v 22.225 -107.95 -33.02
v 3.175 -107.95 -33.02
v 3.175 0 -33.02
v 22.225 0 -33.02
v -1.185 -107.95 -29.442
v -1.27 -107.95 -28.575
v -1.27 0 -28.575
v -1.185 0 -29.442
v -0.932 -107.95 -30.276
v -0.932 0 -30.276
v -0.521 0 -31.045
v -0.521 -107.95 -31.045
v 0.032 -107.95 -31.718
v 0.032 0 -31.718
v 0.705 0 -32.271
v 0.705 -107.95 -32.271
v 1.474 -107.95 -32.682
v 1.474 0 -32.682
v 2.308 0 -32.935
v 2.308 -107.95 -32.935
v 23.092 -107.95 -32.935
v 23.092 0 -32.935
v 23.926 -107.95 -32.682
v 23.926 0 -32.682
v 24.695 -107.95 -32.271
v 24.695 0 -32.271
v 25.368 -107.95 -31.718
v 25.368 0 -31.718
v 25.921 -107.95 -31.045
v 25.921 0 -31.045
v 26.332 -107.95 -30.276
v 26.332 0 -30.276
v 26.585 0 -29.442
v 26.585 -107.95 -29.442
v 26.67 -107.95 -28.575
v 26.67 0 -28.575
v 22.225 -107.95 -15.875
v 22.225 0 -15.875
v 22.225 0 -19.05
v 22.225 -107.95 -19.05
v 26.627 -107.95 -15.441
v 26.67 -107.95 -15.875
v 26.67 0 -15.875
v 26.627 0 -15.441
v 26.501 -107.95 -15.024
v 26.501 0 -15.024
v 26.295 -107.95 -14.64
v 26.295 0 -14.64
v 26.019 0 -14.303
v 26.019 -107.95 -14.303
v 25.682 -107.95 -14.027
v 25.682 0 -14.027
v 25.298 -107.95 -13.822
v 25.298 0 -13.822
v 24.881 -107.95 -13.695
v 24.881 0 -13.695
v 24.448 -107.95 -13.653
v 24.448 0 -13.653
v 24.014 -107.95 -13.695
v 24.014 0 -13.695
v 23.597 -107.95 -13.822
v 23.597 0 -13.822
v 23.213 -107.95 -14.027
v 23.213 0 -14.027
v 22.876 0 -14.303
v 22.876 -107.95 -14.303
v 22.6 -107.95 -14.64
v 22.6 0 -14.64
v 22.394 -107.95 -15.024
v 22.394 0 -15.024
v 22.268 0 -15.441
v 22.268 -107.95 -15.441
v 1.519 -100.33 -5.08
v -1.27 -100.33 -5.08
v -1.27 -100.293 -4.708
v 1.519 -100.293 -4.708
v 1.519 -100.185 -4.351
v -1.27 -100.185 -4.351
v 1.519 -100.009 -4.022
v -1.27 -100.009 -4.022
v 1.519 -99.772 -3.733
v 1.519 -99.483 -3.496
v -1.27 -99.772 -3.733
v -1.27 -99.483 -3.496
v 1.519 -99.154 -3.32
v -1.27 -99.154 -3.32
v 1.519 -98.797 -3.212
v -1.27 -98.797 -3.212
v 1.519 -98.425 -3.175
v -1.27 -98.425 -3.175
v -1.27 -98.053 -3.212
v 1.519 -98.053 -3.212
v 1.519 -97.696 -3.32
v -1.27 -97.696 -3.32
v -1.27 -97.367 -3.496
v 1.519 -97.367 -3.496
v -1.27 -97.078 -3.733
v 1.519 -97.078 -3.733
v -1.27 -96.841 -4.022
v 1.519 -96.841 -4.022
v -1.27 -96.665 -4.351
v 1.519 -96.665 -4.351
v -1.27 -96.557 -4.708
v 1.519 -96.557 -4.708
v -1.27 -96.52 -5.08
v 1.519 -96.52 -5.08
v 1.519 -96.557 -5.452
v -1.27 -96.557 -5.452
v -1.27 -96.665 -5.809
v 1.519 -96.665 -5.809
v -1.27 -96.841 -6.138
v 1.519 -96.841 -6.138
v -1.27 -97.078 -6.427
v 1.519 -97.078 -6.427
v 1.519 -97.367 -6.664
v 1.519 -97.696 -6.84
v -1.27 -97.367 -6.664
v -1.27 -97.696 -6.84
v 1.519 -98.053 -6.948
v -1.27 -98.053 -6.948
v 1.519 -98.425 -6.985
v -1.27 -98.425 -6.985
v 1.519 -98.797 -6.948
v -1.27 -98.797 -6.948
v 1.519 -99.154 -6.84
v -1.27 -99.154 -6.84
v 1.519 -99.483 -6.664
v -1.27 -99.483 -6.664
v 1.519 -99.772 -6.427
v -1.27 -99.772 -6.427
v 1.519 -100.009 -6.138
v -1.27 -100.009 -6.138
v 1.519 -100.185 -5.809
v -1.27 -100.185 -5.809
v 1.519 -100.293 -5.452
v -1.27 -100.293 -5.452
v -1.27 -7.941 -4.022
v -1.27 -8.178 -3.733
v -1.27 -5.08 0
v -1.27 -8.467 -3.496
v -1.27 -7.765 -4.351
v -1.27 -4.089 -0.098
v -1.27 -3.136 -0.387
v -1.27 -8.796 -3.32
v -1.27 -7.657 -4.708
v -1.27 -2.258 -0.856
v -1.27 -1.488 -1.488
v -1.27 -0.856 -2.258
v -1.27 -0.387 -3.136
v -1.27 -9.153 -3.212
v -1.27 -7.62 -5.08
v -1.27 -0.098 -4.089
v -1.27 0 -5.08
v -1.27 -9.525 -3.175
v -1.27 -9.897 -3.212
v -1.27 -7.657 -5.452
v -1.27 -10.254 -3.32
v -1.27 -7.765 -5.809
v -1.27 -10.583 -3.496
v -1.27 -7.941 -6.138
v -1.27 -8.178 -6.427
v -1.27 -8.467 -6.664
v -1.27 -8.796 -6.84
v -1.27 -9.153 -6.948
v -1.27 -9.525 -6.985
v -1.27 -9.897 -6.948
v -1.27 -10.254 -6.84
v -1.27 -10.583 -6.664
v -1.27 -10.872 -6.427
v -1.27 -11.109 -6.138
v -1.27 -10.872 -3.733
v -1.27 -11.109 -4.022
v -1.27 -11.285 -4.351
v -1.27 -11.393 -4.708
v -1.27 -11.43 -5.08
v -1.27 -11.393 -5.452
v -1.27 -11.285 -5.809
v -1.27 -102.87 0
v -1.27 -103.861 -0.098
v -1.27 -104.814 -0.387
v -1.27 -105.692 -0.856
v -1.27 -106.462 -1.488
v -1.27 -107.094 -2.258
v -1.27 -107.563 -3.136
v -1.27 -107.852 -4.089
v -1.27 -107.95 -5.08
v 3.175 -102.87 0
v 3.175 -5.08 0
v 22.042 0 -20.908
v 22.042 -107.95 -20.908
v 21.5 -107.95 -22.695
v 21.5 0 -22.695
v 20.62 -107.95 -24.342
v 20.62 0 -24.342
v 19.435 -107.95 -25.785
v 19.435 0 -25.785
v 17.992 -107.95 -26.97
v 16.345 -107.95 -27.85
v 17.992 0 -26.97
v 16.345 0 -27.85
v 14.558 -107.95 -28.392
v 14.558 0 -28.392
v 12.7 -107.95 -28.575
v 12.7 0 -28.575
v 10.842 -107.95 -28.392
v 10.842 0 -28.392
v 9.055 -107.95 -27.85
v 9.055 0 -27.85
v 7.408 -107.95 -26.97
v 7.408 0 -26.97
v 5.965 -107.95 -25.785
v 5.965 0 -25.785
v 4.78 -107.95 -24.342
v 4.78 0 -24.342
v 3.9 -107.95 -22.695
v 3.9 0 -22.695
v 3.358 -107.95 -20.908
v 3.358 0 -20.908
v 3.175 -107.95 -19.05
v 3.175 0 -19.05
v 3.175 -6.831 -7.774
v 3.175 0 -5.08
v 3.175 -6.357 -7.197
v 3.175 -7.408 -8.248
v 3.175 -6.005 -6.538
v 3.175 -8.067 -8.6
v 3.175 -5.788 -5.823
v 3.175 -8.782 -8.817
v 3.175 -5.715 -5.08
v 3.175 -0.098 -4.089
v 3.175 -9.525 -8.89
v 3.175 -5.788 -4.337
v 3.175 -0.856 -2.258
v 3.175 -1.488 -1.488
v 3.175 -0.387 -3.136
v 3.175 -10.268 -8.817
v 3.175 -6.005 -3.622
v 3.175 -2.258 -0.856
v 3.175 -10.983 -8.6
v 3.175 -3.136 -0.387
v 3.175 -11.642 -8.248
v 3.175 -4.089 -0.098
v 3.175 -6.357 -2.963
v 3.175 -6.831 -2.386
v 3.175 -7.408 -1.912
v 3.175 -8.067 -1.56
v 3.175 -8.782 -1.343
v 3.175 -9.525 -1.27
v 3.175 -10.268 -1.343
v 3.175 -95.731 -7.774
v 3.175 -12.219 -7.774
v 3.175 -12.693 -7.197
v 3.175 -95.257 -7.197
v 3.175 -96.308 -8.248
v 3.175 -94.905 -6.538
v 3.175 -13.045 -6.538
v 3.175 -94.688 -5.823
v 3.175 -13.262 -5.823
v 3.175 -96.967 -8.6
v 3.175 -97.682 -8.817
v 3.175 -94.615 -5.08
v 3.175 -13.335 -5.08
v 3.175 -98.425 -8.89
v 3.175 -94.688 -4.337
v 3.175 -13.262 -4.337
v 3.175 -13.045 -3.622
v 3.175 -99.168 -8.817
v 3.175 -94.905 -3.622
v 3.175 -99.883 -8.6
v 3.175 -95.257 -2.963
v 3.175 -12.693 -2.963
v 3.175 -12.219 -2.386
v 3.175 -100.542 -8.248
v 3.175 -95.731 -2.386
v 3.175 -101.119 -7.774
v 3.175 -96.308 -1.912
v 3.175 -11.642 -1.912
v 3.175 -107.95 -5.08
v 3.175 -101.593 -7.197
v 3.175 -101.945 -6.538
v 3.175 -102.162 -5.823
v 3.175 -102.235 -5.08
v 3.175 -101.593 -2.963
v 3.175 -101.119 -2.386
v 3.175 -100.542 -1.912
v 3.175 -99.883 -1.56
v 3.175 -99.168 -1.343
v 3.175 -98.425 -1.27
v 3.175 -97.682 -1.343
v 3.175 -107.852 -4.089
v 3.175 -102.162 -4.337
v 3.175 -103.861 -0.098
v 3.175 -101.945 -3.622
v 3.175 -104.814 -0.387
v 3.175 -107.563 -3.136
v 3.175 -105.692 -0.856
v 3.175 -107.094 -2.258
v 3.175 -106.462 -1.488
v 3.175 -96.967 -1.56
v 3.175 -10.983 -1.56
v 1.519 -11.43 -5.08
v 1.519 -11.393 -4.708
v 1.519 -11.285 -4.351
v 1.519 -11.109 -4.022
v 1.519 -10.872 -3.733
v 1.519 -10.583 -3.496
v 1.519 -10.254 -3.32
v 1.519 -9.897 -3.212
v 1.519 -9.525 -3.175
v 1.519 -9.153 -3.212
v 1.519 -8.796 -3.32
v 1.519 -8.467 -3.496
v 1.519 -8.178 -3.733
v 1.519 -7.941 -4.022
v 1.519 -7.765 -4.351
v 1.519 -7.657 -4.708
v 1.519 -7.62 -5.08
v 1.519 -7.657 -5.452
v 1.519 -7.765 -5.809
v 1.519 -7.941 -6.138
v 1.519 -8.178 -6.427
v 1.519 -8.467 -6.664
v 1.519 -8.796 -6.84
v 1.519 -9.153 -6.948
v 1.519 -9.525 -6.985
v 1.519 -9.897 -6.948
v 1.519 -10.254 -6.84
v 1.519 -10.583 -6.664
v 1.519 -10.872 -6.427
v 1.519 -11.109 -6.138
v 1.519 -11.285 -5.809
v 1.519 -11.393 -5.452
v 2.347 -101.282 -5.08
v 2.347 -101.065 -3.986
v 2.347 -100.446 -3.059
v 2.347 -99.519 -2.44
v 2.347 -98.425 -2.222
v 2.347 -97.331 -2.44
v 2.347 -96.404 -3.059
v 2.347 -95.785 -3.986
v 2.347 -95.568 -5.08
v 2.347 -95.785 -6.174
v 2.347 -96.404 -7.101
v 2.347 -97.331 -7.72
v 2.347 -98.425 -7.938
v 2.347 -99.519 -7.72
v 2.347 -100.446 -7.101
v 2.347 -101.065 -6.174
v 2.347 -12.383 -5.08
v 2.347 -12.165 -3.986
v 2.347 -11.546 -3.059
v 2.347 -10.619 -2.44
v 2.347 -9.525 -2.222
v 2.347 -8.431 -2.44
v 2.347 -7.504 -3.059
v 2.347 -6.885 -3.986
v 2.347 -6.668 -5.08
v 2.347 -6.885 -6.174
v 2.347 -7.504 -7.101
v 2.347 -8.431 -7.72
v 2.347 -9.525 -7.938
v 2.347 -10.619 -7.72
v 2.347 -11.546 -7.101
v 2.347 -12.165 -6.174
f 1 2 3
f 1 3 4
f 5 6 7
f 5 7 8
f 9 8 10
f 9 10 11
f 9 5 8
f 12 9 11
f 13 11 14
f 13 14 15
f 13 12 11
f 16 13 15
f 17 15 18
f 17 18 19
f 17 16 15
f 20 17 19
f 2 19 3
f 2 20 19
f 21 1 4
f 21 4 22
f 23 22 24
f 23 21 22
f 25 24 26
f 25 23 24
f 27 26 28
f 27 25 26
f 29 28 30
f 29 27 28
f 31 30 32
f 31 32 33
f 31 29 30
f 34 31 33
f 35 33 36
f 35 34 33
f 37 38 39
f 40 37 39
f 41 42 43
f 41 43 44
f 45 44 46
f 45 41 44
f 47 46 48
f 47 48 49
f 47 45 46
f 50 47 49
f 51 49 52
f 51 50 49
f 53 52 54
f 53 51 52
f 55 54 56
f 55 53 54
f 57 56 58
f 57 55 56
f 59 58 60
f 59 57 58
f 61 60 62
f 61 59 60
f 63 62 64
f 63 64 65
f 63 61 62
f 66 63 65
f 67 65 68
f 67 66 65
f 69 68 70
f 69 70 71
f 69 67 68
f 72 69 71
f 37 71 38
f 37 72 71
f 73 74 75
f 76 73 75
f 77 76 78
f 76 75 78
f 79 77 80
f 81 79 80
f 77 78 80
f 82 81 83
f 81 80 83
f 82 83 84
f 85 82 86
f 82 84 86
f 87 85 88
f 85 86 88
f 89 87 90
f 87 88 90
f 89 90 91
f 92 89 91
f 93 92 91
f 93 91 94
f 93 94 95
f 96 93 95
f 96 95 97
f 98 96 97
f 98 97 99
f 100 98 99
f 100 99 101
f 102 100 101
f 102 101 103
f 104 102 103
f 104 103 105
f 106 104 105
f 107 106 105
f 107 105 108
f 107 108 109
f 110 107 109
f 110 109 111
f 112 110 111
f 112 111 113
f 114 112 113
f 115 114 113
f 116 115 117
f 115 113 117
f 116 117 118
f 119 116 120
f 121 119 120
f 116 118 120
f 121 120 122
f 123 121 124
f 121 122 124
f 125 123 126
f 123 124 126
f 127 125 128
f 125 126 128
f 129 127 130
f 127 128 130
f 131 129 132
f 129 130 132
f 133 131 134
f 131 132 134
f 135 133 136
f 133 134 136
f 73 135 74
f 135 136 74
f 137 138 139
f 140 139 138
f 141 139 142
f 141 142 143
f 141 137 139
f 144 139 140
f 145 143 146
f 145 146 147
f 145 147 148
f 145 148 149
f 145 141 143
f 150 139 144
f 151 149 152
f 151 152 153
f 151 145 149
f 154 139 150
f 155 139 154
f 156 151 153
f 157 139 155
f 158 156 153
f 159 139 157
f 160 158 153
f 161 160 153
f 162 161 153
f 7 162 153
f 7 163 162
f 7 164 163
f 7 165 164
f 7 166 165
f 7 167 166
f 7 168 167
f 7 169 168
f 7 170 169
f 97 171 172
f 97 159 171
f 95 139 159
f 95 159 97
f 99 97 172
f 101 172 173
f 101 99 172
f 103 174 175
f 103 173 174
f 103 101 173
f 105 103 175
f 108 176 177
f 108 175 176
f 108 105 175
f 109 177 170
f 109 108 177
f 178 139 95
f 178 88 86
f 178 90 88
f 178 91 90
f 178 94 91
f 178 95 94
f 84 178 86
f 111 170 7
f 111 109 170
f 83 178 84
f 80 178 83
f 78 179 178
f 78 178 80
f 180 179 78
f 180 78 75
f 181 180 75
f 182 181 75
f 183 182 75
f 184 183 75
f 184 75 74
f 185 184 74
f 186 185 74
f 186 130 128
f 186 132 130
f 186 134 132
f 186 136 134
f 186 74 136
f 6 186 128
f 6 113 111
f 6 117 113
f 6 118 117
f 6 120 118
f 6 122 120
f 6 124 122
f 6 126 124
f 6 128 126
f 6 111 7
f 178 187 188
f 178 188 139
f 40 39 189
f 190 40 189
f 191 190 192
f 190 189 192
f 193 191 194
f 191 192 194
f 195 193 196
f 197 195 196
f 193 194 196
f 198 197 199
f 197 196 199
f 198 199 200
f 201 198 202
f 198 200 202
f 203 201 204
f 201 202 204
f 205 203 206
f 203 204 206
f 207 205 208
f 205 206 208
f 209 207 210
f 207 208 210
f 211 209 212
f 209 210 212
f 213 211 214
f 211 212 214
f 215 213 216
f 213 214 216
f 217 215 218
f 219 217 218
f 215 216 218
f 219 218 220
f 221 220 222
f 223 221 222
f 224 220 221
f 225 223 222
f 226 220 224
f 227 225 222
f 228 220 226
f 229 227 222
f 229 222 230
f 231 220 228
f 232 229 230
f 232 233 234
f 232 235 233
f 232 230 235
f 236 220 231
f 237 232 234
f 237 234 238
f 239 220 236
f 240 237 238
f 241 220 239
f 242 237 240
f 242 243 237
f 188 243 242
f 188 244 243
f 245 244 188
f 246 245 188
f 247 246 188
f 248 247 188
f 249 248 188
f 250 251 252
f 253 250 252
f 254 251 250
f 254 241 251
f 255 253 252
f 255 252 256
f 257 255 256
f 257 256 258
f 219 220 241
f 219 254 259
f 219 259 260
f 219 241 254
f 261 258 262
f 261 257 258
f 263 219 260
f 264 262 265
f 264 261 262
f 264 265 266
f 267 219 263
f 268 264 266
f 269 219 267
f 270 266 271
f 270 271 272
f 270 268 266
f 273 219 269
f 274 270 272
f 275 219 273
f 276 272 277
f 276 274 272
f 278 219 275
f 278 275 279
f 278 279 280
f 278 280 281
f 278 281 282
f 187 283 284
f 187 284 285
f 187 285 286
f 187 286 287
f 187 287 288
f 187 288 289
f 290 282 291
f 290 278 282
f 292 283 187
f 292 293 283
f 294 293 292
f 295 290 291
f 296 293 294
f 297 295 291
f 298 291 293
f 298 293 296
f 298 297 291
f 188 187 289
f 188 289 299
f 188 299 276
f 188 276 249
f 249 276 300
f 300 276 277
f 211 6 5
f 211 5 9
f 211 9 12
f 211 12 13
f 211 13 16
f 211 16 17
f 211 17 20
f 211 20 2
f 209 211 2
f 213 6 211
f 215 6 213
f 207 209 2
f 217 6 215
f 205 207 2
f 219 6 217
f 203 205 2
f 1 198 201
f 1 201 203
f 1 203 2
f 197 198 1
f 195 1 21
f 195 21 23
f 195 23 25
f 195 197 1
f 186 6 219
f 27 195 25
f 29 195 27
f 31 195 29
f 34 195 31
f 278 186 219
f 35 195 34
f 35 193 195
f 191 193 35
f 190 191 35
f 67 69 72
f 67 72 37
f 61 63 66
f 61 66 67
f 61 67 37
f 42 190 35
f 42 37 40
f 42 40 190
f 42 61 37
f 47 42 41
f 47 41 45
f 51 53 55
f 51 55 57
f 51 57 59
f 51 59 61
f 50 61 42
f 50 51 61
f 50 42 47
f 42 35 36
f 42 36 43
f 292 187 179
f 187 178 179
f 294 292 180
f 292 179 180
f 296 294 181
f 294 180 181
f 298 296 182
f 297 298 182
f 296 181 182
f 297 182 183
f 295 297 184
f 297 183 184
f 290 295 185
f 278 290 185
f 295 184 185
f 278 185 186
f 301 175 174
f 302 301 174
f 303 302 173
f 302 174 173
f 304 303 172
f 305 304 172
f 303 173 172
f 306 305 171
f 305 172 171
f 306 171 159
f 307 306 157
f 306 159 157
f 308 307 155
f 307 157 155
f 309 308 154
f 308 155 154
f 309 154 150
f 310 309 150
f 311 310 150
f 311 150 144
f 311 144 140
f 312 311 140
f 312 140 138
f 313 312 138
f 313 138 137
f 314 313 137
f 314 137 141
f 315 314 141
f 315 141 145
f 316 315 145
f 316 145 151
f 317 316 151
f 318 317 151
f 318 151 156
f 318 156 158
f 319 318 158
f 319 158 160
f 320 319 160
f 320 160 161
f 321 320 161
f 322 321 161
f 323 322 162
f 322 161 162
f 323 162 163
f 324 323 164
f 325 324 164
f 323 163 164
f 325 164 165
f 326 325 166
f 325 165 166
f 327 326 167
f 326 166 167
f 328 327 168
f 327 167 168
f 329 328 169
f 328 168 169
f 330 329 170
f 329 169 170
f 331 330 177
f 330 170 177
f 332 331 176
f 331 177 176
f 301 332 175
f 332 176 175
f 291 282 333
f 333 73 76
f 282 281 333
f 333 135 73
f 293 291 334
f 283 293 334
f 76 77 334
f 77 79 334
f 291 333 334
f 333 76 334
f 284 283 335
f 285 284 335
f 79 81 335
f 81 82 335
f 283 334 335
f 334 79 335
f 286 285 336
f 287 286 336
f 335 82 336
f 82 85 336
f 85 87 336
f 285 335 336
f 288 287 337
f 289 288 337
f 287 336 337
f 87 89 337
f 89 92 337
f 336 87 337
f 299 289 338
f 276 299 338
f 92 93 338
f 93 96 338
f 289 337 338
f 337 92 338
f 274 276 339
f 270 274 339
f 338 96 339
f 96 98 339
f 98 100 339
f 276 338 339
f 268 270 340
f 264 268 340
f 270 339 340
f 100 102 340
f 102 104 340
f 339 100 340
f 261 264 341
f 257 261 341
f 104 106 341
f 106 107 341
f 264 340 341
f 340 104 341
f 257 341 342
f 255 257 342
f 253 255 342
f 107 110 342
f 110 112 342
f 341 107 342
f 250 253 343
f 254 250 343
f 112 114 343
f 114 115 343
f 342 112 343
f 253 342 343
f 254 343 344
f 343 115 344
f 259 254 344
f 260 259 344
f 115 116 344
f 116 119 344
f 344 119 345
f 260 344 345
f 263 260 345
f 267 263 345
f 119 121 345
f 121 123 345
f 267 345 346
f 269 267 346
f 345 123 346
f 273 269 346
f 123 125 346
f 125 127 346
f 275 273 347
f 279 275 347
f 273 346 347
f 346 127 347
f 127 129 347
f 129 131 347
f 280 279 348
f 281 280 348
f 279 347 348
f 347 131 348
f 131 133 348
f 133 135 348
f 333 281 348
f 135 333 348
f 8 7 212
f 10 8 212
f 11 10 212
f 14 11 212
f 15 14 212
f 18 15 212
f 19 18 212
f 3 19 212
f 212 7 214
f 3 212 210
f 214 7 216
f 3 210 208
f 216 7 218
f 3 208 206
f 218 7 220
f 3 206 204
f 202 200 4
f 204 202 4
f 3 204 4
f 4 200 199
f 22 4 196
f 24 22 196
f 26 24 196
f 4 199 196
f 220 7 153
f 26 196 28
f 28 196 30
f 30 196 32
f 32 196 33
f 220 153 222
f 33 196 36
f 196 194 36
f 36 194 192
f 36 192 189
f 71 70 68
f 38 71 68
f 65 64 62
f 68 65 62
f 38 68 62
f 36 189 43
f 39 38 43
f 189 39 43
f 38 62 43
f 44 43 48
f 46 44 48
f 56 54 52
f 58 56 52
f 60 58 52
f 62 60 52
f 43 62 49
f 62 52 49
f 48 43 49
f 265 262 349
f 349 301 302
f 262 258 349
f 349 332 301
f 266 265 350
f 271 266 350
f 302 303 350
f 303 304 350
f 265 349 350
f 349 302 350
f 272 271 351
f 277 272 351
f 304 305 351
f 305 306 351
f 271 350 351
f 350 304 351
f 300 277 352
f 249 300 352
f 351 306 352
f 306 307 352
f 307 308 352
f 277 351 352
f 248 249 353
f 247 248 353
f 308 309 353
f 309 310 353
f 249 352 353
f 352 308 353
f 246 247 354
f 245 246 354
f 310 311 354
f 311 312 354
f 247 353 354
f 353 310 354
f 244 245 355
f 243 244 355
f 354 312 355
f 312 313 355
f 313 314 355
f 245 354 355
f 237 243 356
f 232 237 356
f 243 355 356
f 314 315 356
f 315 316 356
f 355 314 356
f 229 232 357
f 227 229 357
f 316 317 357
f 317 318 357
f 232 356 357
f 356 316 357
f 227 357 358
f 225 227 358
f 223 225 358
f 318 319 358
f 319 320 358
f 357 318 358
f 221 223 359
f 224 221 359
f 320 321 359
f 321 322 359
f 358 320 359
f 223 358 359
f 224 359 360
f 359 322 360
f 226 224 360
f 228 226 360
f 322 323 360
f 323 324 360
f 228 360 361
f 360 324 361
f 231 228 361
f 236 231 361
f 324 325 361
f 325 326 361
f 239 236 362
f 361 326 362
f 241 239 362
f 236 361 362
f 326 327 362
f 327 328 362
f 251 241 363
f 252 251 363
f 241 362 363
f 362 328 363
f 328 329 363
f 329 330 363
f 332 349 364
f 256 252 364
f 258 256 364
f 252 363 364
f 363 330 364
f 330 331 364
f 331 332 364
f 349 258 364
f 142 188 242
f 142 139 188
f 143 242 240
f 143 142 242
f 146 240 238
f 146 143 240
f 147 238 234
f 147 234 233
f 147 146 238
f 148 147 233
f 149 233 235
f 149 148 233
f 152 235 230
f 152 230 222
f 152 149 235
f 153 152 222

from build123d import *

# Parameters (mm, degrees)
F1_DEPTH  = 107.95
F3_R      = 1.5875
F2_R      = 1.905
F4_DEPTH  = 25.4
F5_SIZE2  = 1.4351924041
F5_SIZE   = 1.651
F7_DEPTH  = 107.95
F8_R      = 1.905
F9_DEPTH  = 25.4
F10_SIZE2 = 1.6559912355
F10_SIZE  = 1.905
F11_R     = 5.08


with BuildPart() as f1:
    # F0 (on Front) → F1 (new body)
    with BuildSketch(Plane.XZ):
        with BuildLine():
            Line((3.175, 0), (0, 0))
            Line((0, 0), (0, -28.575))
            ThreePointArc((0, -28.575), (0.9299359697, -30.8200640303), (3.175, -31.75))
            Line((3.175, -31.75), (22.225, -31.75))
            ThreePointArc((22.225, -31.75), (24.4700640303, -30.8200640303), (25.4, -28.575))
            Line((25.4, -28.575), (25.4, -15.875))
            ThreePointArc((25.4, -15.875), (23.8125, -14.2875), (22.225, -15.875))
            Line((22.225, -15.875), (22.225, -19.05))
            ThreePointArc((22.225, -19.05), (12.7, -28.575), (3.175, -19.05))
            Line((3.175, -19.05), (3.175, 0))
        make_face()
    extrude(amount=F1_DEPTH)

    # F3
    f3_edges = [f1.edges().sort_by_distance(p)[0] for p in [
        (1.5875, 0, 0),
        (1.5875, -107.95, 0),
    ]]
    fillet(f3_edges, radius=F3_R)

    # F2 (on face) → F4 (cut)
    with BuildSketch(Plane(origin=(0, 0, 0), x_dir=(0, -1, 0), z_dir=(-1, 0, 0))):
        with Locations((9.525, -5.08)):
            Circle(F2_R)
        with Locations((98.425, -5.08)):
            Circle(F2_R)
    extrude(amount=-F4_DEPTH, mode=Mode.SUBTRACT)

    # F5
    f5_edges = [f1.edges().sort_by_distance(p)[0] for p in [
        (3.175, -96.52, -5.08),
        (3.175, -7.62, -5.08),
    ]]
    chamfer(f5_edges, length=F5_SIZE, length2=F5_SIZE2)

    # F6 (on face) → F7 (join, through all)
    with BuildSketch(Plane.XZ.offset(107.95)):
        with BuildLine():
            Line((3.175, 0), (0, 0))
            Line((0, 0), (0, -28.575))
            ThreePointArc((0, -28.575), (0.9299359697, -30.8200640303), (3.175, -31.75))
            Line((3.175, -31.75), (22.225, -31.75))
            ThreePointArc((22.225, -31.75), (24.4700640303, -30.8200640303), (25.4, -28.575))
            Line((25.4, -28.575), (25.4, -15.875))
            ThreePointArc((25.4, -15.875), (23.8125, -14.2875), (22.225, -15.875))
            Line((22.225, -15.875), (22.225, -19.05))
            ThreePointArc((22.225, -19.05), (12.7, -28.575), (3.175, -19.05))
            Line((3.175, -19.05), (3.175, 0))
        make_face()
        with BuildLine():
            Line((0, -28.575), (0, 0))
            Line((0, 0), (-1.27, 0))
            Line((-1.27, 0), (-1.27, -28.575))
            ThreePointArc((-1.27, -28.575), (0.0319103576, -31.7180896424), (3.175, -33.02))
            Line((3.175, -33.02), (22.225, -33.02))
            ThreePointArc((22.225, -33.02), (25.3680896424, -31.7180896424), (26.67, -28.575))
            Line((26.67, -28.575), (26.67, -15.875))
            ThreePointArc((26.67, -15.875), (24.4475, -13.6525), (22.225, -15.875))
            ThreePointArc((22.225, -15.875), (23.8125, -14.2875), (25.4, -15.875))
            Line((25.4, -15.875), (25.4, -28.575))
            ThreePointArc((25.4, -28.575), (24.4700640303, -30.8200640303), (22.225, -31.75))
            Line((22.225, -31.75), (3.175, -31.75))
            ThreePointArc((3.175, -31.75), (0.9299359697, -30.8200640303), (0, -28.575))
        make_face()
    extrude(amount=-F7_DEPTH)

    # F8 (on face) → F9 (cut)
    with BuildSketch(Plane(origin=(-1.27, 0, 0), x_dir=(0, -1, 0), z_dir=(-1, 0, 0))):
        with Locations((9.525, -5.08)):
            Circle(F8_R)
        with Locations((98.425, -5.08)):
            Circle(F8_R)
    extrude(amount=-F9_DEPTH, mode=Mode.SUBTRACT)

    # F10
    f10_edges = [f1.edges().sort_by_distance(p)[0] for p in [
        (3.175, -96.52, -5.08),
        (3.175, -7.62, -5.08),
    ]]
    chamfer(f10_edges, length=F10_SIZE, length2=F10_SIZE2)

    # F11
    f11_edges = [f1.edges().sort_by_distance(p)[0] for p in [
        (0.9525, -107.95, 0),
        (0.9525, 0, 0),
    ]]
    fillet(f11_edges, radius=F11_R)


solid = f1.part
